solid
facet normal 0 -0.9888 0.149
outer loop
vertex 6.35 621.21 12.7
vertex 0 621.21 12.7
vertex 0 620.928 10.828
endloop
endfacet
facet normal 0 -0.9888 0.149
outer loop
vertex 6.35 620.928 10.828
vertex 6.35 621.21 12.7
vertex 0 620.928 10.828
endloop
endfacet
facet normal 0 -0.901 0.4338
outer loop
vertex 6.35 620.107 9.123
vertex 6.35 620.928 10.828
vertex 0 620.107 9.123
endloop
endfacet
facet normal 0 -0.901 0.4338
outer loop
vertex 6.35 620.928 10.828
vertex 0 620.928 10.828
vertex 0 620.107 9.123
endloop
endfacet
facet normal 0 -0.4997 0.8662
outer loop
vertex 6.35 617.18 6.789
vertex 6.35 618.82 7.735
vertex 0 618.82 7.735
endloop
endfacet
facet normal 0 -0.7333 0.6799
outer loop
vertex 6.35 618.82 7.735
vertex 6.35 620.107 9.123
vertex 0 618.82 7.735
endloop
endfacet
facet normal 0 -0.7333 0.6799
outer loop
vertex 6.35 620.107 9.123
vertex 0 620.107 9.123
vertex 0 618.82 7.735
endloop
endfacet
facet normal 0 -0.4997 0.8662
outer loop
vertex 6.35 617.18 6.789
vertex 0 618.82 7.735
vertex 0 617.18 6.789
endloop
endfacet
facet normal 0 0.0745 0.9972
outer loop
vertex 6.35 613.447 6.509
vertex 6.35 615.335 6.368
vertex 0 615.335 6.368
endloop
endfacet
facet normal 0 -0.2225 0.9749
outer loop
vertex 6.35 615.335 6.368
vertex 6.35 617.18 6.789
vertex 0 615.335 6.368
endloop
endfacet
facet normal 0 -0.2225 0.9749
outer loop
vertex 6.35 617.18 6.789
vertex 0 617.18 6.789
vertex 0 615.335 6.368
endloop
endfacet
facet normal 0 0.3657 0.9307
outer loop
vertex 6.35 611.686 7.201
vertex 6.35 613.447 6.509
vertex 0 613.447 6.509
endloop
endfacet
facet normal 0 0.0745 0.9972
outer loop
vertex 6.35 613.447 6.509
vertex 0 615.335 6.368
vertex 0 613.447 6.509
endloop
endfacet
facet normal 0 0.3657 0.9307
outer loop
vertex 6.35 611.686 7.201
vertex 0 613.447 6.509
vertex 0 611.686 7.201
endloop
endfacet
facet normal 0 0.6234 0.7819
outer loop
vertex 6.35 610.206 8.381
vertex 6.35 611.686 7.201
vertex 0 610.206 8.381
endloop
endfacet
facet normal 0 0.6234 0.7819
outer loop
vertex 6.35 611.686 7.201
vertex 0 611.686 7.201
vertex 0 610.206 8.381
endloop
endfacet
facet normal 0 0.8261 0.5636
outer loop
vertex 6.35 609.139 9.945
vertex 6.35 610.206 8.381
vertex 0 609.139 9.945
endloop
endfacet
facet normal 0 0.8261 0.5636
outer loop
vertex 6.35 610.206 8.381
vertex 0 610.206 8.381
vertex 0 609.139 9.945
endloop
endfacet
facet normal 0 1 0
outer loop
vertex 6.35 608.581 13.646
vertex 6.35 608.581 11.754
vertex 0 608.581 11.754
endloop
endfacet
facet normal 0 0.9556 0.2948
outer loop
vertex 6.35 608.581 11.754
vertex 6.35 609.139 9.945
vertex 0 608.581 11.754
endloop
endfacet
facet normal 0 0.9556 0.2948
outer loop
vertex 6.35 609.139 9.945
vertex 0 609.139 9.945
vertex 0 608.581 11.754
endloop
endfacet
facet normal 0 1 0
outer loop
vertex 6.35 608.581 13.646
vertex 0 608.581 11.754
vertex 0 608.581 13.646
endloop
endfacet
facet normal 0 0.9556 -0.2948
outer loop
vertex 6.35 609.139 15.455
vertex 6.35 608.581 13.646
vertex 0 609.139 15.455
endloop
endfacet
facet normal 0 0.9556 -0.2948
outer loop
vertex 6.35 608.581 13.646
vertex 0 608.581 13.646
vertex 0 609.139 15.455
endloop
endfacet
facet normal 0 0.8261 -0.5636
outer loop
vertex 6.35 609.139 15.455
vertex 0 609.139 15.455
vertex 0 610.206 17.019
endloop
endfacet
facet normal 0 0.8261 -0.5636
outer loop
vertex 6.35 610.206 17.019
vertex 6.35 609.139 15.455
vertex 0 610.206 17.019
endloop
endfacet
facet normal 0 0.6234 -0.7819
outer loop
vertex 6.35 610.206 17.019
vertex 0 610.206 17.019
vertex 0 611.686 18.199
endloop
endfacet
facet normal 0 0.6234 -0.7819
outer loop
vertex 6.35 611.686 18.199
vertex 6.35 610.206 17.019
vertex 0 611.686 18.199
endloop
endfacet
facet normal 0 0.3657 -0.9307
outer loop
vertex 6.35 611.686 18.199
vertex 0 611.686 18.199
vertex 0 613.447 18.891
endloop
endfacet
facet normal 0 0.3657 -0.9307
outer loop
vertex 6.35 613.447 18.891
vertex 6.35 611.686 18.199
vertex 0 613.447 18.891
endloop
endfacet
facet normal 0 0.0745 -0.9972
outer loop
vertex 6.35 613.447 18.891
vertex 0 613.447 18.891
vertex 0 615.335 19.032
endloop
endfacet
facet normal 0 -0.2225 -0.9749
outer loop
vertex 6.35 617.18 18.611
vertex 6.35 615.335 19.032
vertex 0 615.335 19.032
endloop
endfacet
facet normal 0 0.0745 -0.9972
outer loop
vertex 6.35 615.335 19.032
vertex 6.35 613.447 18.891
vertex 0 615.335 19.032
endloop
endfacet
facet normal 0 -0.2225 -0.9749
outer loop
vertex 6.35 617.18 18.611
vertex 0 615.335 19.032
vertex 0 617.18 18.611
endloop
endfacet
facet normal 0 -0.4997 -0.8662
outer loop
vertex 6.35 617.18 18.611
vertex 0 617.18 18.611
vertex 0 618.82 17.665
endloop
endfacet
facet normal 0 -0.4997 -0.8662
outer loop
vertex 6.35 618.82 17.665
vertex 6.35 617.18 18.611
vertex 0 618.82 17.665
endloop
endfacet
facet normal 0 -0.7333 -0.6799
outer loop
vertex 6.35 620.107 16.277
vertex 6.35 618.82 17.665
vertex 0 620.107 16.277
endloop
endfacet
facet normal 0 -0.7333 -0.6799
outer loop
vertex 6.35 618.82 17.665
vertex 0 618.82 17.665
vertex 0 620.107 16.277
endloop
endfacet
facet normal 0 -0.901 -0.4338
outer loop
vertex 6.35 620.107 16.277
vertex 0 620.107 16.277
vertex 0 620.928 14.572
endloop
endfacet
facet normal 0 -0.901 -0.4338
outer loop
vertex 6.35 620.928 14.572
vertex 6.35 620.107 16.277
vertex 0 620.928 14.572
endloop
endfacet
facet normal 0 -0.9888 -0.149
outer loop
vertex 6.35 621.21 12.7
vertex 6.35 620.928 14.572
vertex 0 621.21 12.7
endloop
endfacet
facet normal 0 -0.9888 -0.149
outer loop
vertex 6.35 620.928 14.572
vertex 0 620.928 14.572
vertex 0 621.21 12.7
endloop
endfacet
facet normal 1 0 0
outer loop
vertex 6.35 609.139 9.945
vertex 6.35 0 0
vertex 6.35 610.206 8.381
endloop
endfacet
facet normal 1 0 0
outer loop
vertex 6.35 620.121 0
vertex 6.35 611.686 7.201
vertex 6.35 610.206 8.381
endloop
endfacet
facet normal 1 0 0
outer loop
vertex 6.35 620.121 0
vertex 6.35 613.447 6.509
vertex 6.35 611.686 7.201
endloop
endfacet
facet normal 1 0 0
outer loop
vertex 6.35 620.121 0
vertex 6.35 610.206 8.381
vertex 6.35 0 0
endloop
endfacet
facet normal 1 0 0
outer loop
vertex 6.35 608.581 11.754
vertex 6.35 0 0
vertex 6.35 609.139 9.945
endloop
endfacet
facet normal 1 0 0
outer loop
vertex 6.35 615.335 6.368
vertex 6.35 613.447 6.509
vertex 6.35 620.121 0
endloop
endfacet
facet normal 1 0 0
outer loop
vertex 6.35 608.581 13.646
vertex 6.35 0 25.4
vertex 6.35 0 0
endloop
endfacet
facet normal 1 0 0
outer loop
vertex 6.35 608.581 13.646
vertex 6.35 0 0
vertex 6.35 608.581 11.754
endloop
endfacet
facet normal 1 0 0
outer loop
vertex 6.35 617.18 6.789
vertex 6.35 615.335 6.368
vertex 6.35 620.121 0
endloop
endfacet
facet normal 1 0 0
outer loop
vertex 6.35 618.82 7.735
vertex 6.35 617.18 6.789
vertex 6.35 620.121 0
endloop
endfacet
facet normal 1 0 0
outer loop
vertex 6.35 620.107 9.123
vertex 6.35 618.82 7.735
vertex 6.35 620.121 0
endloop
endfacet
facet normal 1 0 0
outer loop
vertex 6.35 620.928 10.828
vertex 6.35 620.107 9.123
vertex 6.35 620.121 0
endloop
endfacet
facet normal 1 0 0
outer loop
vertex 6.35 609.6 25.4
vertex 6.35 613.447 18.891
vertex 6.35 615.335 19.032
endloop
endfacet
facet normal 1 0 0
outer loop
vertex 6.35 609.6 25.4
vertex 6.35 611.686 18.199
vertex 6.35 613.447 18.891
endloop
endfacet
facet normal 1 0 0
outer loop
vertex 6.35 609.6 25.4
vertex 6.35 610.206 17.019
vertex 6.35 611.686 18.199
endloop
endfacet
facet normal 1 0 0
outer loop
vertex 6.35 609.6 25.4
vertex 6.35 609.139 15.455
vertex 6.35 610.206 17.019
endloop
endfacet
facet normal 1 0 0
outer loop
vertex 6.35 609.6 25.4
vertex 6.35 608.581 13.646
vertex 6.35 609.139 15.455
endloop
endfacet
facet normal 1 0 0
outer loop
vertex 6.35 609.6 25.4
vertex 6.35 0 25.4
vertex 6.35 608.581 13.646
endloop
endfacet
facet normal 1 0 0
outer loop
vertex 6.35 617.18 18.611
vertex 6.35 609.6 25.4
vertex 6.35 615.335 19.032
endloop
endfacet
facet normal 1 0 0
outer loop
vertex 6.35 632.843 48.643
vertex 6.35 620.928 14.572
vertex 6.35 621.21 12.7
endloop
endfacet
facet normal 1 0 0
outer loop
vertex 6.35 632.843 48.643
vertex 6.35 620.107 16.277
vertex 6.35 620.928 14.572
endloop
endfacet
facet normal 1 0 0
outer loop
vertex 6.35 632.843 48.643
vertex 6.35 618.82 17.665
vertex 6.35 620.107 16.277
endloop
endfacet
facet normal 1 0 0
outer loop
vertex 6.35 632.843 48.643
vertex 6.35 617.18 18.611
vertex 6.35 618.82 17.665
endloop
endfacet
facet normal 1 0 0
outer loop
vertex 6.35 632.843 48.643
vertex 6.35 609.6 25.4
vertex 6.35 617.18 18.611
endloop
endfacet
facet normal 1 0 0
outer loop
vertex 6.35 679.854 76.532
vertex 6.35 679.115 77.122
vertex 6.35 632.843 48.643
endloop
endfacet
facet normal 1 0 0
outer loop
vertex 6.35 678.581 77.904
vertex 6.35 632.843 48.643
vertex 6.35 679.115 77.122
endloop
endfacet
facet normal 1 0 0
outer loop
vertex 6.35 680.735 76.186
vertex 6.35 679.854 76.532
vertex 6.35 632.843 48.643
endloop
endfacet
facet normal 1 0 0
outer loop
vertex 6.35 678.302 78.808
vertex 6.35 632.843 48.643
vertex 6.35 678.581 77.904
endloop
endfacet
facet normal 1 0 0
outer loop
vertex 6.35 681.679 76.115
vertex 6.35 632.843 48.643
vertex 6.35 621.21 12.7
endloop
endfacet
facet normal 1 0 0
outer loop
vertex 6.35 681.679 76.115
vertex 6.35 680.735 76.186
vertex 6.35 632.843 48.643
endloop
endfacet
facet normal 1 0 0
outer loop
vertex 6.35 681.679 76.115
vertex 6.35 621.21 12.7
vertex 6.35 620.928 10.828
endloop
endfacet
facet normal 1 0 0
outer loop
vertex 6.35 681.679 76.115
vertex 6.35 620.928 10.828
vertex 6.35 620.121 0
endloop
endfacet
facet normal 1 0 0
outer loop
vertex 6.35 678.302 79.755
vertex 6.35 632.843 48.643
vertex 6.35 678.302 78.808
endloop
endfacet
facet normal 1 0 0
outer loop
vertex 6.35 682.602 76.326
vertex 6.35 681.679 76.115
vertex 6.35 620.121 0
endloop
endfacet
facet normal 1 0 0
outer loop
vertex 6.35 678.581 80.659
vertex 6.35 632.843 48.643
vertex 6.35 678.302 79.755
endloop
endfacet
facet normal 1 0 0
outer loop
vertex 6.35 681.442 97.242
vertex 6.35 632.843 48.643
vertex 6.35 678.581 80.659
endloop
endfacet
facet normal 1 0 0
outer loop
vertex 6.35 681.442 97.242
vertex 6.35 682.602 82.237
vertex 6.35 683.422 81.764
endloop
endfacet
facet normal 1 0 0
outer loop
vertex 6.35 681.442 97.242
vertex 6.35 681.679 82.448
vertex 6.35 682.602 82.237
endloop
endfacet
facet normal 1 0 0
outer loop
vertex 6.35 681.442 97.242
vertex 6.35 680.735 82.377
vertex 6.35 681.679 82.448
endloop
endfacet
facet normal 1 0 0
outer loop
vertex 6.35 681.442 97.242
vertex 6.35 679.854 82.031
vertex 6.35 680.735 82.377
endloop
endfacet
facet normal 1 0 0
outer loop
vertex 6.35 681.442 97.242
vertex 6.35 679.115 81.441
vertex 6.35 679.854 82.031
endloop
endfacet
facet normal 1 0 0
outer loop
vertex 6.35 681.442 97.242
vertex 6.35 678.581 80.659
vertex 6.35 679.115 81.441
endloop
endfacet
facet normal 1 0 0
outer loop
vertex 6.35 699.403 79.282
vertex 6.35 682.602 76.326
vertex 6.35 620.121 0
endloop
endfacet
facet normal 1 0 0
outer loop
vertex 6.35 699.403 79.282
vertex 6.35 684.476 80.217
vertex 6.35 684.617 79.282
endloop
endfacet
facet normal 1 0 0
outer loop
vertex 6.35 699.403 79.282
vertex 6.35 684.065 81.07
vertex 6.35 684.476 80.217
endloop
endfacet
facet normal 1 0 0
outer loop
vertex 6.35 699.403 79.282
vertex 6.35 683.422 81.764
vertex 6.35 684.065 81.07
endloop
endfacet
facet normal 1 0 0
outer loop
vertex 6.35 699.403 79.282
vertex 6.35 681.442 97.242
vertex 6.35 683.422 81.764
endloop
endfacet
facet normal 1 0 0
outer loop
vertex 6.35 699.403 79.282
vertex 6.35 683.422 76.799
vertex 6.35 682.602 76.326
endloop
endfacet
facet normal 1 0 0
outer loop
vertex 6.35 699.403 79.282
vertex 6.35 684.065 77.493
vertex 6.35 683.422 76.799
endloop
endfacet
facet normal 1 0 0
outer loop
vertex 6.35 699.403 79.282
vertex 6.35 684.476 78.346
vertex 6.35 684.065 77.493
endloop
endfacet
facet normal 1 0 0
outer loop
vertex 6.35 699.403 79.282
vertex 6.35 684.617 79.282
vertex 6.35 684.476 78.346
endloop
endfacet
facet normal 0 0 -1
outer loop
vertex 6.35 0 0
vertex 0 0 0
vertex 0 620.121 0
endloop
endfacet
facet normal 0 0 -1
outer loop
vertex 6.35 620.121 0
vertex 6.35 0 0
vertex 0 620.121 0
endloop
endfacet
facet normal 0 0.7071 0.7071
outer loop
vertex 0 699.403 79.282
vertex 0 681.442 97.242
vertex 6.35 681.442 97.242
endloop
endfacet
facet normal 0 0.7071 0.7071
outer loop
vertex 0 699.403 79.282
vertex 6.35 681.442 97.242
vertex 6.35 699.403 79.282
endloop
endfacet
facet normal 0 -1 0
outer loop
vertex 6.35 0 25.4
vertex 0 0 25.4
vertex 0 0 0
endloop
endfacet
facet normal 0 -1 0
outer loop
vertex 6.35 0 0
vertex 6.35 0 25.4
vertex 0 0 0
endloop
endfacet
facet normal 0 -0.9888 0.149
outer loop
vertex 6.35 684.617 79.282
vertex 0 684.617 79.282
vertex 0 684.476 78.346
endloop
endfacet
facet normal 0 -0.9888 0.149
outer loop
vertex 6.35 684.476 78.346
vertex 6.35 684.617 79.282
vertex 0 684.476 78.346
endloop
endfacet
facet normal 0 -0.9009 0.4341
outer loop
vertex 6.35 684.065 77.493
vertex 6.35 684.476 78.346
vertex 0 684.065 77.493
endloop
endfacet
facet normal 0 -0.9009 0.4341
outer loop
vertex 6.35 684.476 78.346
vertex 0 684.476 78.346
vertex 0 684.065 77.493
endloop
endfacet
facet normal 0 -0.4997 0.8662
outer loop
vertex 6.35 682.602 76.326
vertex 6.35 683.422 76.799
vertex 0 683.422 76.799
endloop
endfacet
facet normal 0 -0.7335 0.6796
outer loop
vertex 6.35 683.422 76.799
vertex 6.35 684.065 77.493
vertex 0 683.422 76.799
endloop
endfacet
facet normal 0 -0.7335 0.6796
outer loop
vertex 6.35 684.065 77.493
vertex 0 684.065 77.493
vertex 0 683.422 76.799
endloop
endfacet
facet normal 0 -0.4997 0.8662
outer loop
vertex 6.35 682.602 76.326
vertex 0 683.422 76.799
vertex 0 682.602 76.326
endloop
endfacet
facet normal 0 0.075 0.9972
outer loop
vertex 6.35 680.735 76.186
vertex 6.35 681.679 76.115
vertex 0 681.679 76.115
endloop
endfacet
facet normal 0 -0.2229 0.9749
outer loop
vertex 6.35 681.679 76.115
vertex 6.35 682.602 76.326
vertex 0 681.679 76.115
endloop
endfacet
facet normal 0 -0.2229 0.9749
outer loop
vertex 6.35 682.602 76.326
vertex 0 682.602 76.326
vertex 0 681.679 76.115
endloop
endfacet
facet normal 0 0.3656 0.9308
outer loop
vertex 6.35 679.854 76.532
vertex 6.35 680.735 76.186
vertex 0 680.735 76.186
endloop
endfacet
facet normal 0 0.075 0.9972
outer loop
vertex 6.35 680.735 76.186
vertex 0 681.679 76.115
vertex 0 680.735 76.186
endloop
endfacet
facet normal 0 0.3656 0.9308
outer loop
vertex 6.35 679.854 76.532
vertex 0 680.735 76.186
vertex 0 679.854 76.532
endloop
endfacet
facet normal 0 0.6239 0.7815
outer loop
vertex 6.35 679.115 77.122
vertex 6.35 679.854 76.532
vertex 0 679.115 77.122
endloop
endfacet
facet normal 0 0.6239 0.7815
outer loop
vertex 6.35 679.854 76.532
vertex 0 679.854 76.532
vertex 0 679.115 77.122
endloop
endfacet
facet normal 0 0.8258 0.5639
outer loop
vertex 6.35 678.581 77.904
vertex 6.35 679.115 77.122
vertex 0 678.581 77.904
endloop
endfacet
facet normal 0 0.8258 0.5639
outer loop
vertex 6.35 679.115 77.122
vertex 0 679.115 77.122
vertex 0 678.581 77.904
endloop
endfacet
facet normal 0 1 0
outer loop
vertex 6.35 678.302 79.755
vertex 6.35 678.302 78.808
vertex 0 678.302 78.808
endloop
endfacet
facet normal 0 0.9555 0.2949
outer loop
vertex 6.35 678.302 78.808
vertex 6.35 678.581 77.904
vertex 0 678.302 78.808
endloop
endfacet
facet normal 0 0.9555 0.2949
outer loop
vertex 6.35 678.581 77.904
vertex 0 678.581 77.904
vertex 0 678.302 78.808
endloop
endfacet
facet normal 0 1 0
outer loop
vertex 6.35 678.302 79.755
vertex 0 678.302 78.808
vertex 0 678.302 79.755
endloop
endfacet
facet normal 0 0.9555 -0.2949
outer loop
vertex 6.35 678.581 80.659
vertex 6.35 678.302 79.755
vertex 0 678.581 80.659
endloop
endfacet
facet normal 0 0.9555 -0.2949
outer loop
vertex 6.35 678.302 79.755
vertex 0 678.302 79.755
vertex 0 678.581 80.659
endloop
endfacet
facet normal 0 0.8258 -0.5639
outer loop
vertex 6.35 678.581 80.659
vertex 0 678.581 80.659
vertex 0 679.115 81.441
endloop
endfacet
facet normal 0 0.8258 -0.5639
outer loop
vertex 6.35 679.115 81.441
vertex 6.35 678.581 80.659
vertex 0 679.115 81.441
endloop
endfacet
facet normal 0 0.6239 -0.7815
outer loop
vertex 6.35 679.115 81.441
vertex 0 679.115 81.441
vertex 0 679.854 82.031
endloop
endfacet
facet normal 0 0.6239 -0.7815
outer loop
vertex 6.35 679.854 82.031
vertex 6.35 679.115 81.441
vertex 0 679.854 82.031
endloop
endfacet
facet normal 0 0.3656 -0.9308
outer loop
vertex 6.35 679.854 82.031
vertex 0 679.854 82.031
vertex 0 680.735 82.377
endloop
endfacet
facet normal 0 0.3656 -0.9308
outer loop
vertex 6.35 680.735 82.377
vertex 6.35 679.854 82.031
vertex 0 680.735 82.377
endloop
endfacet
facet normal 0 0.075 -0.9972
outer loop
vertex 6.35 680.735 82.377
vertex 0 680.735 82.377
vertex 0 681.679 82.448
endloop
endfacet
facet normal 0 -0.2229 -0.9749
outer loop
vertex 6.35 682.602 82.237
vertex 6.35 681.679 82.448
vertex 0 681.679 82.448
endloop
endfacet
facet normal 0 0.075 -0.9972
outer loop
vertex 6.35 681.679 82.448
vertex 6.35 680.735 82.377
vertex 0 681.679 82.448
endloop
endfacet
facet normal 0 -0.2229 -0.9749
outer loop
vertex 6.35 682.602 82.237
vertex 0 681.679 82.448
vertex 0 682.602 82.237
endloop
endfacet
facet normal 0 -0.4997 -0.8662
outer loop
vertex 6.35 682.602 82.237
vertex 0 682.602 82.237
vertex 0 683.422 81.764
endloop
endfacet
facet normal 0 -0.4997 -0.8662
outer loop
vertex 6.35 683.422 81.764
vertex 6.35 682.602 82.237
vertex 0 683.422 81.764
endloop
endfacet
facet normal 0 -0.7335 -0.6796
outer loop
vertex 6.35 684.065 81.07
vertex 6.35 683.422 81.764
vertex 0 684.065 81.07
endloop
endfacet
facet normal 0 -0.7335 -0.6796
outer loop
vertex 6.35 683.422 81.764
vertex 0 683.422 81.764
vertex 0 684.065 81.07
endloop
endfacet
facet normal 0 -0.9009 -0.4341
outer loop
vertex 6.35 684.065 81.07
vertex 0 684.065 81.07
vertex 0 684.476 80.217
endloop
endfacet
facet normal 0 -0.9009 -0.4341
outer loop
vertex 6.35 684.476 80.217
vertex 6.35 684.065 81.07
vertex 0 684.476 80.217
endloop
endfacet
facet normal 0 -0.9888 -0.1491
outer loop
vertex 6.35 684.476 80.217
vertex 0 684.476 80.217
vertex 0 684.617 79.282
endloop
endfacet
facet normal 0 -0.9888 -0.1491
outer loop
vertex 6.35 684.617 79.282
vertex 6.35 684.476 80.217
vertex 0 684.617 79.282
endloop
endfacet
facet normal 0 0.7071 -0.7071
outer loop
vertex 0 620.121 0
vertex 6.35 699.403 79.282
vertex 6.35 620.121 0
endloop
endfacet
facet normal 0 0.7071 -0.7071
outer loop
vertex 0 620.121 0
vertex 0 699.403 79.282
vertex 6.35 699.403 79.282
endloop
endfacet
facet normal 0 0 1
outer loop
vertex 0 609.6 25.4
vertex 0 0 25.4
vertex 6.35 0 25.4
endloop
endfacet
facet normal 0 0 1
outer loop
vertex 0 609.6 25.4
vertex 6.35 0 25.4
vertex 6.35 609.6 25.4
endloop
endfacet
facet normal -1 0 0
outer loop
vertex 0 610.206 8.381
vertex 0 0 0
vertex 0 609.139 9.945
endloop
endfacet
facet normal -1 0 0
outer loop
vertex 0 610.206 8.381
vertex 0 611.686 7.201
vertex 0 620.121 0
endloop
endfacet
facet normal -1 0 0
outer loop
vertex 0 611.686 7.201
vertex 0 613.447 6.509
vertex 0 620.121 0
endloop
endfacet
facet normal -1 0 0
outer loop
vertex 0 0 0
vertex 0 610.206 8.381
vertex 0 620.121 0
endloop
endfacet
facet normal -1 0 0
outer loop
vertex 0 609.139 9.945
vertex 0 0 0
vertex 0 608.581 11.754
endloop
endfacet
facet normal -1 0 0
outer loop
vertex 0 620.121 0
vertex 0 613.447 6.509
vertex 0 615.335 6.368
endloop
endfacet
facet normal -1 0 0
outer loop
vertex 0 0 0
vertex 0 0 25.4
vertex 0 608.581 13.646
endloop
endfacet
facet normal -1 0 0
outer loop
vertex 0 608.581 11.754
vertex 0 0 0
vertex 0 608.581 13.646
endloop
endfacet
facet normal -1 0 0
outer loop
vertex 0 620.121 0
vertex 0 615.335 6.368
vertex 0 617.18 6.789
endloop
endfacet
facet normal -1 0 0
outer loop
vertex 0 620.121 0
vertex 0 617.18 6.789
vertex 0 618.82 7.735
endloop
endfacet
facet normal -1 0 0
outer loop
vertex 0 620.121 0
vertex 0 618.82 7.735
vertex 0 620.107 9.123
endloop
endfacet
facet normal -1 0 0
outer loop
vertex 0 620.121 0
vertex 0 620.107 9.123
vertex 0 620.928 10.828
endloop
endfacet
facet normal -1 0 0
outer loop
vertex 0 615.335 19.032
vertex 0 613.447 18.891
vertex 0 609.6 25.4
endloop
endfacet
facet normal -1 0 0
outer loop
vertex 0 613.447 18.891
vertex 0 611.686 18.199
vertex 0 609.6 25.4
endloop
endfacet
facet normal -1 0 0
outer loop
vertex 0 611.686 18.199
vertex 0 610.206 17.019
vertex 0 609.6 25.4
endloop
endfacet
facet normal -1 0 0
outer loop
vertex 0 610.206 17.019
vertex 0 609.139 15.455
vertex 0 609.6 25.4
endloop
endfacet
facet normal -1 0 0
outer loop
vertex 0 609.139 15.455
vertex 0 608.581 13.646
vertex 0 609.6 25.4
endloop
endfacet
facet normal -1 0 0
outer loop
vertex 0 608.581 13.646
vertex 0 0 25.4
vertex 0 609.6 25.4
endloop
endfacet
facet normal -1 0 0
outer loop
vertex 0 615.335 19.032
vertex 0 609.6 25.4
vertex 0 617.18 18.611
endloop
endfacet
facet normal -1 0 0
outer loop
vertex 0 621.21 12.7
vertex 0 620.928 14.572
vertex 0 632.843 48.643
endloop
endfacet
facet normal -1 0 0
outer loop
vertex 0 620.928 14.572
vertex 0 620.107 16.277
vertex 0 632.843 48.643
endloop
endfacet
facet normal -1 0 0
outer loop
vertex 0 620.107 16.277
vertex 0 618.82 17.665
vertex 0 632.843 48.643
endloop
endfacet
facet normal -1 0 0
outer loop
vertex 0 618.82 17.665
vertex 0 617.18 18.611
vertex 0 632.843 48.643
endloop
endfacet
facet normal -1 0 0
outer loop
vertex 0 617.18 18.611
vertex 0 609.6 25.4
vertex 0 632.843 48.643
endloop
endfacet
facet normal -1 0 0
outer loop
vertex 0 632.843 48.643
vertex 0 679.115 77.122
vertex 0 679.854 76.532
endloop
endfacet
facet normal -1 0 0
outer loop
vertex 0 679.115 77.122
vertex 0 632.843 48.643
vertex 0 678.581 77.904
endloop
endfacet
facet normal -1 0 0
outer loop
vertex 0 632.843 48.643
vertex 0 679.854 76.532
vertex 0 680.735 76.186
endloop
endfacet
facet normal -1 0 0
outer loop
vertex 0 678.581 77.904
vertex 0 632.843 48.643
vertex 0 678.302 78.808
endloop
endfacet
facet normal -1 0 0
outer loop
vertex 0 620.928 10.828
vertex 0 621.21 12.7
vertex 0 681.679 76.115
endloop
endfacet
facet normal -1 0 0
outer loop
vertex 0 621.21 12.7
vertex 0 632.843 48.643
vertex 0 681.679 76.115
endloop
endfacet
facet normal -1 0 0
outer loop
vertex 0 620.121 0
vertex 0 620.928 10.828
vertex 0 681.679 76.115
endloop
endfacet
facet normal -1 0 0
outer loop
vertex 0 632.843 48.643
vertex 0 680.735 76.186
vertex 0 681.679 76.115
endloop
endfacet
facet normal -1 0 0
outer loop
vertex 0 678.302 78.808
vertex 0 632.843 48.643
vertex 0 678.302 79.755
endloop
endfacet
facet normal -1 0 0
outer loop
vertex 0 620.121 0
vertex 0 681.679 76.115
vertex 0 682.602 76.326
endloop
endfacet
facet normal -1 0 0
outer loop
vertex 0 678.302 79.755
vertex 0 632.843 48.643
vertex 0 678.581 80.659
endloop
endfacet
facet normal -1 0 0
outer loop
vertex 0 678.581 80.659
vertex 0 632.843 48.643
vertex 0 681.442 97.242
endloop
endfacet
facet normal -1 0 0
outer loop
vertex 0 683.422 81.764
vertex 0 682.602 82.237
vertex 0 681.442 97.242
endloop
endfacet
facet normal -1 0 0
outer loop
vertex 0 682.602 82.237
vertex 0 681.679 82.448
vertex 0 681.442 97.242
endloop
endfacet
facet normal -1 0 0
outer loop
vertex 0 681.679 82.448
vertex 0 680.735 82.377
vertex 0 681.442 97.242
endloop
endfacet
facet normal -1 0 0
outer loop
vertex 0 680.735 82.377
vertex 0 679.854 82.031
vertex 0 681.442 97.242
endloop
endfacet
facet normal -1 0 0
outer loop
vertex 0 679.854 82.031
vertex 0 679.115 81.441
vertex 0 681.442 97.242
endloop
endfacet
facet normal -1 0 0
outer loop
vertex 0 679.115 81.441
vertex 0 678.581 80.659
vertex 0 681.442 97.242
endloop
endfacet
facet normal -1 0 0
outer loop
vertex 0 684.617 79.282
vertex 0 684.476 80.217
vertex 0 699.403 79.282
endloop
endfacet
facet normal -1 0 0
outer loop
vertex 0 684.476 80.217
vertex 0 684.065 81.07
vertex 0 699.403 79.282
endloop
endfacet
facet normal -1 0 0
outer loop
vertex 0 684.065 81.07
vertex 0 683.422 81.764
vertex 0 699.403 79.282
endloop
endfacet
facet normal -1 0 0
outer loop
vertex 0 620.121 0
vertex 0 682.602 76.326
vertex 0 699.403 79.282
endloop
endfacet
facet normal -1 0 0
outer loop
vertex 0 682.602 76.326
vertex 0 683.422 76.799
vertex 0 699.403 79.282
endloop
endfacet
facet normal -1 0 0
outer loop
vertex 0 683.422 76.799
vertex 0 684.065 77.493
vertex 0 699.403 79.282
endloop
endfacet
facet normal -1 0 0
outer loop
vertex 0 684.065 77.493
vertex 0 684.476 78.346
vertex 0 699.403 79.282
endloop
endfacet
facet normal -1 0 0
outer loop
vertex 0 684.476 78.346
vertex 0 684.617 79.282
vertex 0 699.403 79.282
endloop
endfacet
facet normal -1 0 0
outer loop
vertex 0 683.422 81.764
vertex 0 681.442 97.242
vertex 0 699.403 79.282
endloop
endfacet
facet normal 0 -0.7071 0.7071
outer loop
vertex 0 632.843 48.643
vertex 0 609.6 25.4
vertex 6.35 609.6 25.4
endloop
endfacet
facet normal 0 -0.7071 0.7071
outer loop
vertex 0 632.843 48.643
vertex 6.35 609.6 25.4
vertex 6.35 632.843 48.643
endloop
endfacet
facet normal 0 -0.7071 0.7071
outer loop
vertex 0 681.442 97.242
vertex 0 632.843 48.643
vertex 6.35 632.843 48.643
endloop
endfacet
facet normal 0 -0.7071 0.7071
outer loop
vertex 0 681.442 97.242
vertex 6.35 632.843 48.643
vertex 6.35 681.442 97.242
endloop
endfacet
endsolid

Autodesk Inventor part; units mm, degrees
ref_plane "YZ Plane" through (0, 0, 0) normal (1, 0, 0) x (0, 1, 0)
ref_plane "XZ Plane" through (0, 0, 0) normal (0, 1, 0) x (-1, 0, 0)
ref_plane "XY Plane" through (0, 0, 0) normal (0, 0, 1) x (1, 0, 0)
sketch "Sketch1" plane through (0, 0, 0) normal (1, 0, 0) x (0, 1, 0)
  line L0 (0, 25.4) -> (0, 0)
  line L1 (0, 25.4) -> (609.6, 25.4)
  line L2 (609.6, 25.4) -> (681.442, 97.242)
  line L3 (681.442, 97.242) -> (632.8429, 48.6429)
  line L4 (681.442, 97.242) -> (699.4026, 79.2815)
  line L5 (699.4026, 79.2815) -> (620.121, 0)
  line L6 (0, 0) -> (620.121, 0)
  line L7 (609.6, 25.4) -> (620.121, 0) construction
  circle A0 centre (614.8605, 12.7) radius 6.35
  circle A1 centre (681.442, 79.2815) radius 3.175
  dimension "d0" = 25.4
  dimension "d7" = 609.6
  dimension "d8" = 101.6
  dimension "d9" = 135
  dimension "d10" = 25.4
  dimension "d11" = 12.7
  dimension "d12" = 6.35
  dimension "d13" = 12.7
  dimension "d14" = 12.7
extrude "Extrusion1" add sketch "Sketch1" along normal blind 6.35
properties part number "Cart Handle"
